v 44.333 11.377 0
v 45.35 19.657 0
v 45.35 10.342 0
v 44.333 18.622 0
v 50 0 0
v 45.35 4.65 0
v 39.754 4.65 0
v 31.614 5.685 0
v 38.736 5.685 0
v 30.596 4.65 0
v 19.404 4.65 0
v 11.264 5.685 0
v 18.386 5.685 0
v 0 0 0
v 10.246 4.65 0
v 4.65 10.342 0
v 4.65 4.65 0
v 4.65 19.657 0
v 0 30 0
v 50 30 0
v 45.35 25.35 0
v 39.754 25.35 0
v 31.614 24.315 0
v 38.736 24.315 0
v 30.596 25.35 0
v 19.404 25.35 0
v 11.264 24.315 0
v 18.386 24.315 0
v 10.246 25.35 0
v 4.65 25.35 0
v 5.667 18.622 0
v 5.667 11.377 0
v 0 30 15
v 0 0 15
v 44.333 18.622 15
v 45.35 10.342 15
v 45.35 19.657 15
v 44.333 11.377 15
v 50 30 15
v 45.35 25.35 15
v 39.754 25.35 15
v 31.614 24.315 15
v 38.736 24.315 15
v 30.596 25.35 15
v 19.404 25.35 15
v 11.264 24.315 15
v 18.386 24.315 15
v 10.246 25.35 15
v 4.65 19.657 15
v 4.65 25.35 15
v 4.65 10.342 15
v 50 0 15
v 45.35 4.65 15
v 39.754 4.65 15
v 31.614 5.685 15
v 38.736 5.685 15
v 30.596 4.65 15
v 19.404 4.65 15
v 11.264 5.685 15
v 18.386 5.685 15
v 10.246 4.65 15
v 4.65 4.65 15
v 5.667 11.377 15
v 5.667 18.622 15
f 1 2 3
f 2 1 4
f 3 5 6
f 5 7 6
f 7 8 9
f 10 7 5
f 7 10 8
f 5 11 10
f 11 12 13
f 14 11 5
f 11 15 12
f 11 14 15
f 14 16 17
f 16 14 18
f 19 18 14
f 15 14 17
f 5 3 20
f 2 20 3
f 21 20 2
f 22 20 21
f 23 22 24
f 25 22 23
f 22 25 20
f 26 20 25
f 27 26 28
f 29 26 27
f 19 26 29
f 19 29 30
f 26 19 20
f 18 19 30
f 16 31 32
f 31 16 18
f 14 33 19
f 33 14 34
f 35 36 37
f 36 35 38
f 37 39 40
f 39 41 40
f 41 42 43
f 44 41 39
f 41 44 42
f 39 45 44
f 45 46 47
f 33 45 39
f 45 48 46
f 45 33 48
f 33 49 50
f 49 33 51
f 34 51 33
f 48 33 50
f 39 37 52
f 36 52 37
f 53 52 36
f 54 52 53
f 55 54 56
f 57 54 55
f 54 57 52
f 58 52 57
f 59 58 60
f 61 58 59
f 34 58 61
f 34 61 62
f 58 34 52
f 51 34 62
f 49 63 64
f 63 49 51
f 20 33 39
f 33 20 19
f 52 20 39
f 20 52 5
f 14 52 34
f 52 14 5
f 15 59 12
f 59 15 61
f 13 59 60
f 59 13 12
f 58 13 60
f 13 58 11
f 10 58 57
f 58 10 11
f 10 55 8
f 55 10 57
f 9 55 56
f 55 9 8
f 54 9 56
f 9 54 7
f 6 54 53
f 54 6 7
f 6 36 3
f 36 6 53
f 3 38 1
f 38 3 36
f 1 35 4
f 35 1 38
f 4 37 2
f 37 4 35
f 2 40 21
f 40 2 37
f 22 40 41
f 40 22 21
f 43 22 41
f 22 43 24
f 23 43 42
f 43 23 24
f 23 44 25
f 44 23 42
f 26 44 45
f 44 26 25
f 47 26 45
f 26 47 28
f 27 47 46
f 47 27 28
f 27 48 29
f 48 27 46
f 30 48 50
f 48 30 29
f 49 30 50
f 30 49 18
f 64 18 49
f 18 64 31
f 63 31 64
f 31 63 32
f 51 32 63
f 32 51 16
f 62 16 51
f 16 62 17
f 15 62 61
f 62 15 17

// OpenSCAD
// file: constants.scad
tolerance=0.7;
oversize = 0.7;
lengthHoleSpacing=20;
wallWidth=5;
//vslotIndentHeight=4;
vslotIndentHeight= 1;
//indentWidthOutside = 6;
indentWidthOutside = 9;
//indentWidthInside = 6;
indentWidthInside = 7;
sectionWidth=20;
profileSize=20;
sectionCountWidth = 2;
sectionCountDepth = 1;
extrusionWidth=profileSize*sectionCountWidth;
extrusionDepth=profileSize*sectionCountDepth;
nema17Width = 42.3;
nema17HoleRadius = 11.05 + tolerance/2;
nema17Height = 3.5*extrusionWidth;
nema17BoltSpacing = 31;
nema17BeltHoleHeight = 8;
nema17BeltOffsetFromTopExtrusion = 8;
nema17BeltHeightWidth = 15;
wallSpacing=5;
screwHeight = wallSpacing+vslotIndentHeight;
// main file
include<constants.scad>;

testPiece=true;
if (testPiece) {
    zExtrusionLength = 15;
    zExtrusionWidthSections = 2;
    zExtrusionDepthSections = 1;
    difference() {
        linear_extrude(height=zExtrusionLength)
            square([
                sectionWidth*zExtrusionWidthSections+wallWidth*2,
                sectionWidth*zExtrusionDepthSections+wallWidth*2
            ]);
        translate([wallWidth, wallWidth, 0]) {
            linear_extrude(height=zExtrusionLength)
            VSlot2dProfile(
                sectionCountWidth=zExtrusionWidthSections, 
                sectionCountDepth=zExtrusionDepthSections,
                indentHeight=vslotIndentHeight,
                oversize=oversize
            );
        }; 
        /*
        negativeSpaceHoles(
            extrusionLength=zExtrusionLength,
            fullIndentHeight=wallWidth+vslotIndentHeight,
            firstIndentOffset=wallWidth,
            widthSections=zExtrusionWidthSections,
            lengthHoleSpacing=lengthHoleSpacing
        );*/        
    };
}

module extrusionIndent(_indentWidthInside, _indentWidthOutside, _indentHeight) {
    polygon(points=[
            [0,0], 
            [(_indentWidthOutside-_indentWidthInside)/2, _indentHeight], 
            [_indentWidthInside + (_indentWidthOutside-_indentWidthInside)/2, _indentHeight],
            [_indentWidthOutside, 0]
        ]);
};

module VSlot2dProfile(
    extrusionLength,
    sectionWidth = 20,
    indentHeight = vslotIndentHeight,
    sectionCountWidth,
    sectionCountDepth,
    topIndent = true,
    bottomIndent = true,
    leftIndent = true,
    rightIndent = true,
    oversize = 0
)
{
    translate([-oversize/2,-oversize/2,-oversize/2])
    resize([
        sectionWidth*sectionCountWidth+oversize,
        sectionWidth*sectionCountDepth+oversize,
        extrusionLength+oversize
    ]) difference() {
        
            square(
                size=[
                    sectionWidth*sectionCountWidth, 
                    sectionWidth*sectionCountDepth
                ]
            );
        for(i = [0:sectionCountWidth]) {
            // bottom indents
            if (bottomIndent) 
                translate([i * sectionWidth + (sectionWidth-indentWidthOutside)/2, 0, 0])
                extrusionIndent(indentWidthInside,indentWidthOutside,indentHeight);
            
            // top indents
            if (topIndent)
                translate([
                    i * sectionWidth + (sectionWidth-indentWidthOutside)/2, 
                    sectionWidth*sectionCountDepth, 
                    0
                ])
                rotate([180,0,0])
                extrusionIndent(indentWidthInside,indentWidthOutside,indentHeight);
        }
        for(i = [0:sectionCountDepth]) {
            // left side indent
            if (leftIndent)
                translate([0, (i+1) * sectionWidth - (sectionWidth-indentWidthOutside)/2, 0])
                rotate([0,0,-90]) 
                extrusionIndent(indentWidthInside,indentWidthOutside,indentHeight);
            
            // right side inden
            if (rightIndent)
                translate([
                    sectionWidth*sectionCountWidth, 
                    i * sectionWidth + (sectionWidth-indentWidthOutside)/2, 
                    0
                ])
                rotate([0,0,90]) 
                extrusionIndent(indentWidthInside,indentWidthOutside,indentHeight);
        }
    }
};


module negativeSpaceHole(
    largeHoleIndent = largeHoleIndent,
    fullIndentHeight = wallSpacing+vslotIndentHeight,
    largeHoleRadius = 5,
    smallHoleRadius = 2.5,
    )
{ 
    cylinder(h=largeHoleHeight,r=largeHoleRadius,center=false, $fn=90);
    cylinder(h=fullIndentHeight,r=smallHoleRadius,center=false, $fn=90);
}

module negativeSpaceHolePoints(
    largeHoleIndent = 1,
    largeHoleRadius = 5,
    smallHoleRadius = 2.5,
    fullIndentHeight,
    points = []
    )
{
    for (i=[0:len(points)-1]){
        translate([points[i][1],0,points[i][0]]) {
            rotate([-90,0,0]) {
                echo(points[i][0], points[i][1]);
                negativeSpaceHole(
                    largeHoleHeight=largeHoleIndent,
                    fullIndentHeight=fullIndentHeight,
                    largeHoleRadius=largeHoleRadius,
                    smallHoleRadius=smallHoleRadius);
            };
        }
    }
}

module negativeSpaceHoles(
    largeHoleIndent = 1,
    largeHoleRadius = 5,
    smallHoleRadius = 2.5,
    widthHoleSpacing = 20,
    fullIndentHeight,
    lengthHoleSpacing,
    extrusionLength,
    firstIndentOffset,
    widthSections
    ) 
{
    
    negativeSpaceHolePoints(
        largeHoleIndent = largeHoleIndent,
        largeHoleRadius = largeHoleRadius,
        smallHoleRadius = smallHoleRadius,
        fullIndentHeight = fullIndentHeight,
        lengthHoleSpacing = lengthHoleSpacing,
        widthSections = widthSections,
        points=[ 
            for (p = [lengthHoleSpacing/2+firstIndentOffset:lengthHoleSpacing:extrusionLength-firstIndentOffset-lengthHoleSpacing/2]) 
            for (s = [firstIndentOffset+widthHoleSpacing/2:widthHoleSpacing:widthHoleSpacing*widthSections]) 
            [p,s]
         ]
            
    );
}


module drawVslotExtrusion(
    height, 
    sectionCountWidth, 
    sectionCountDepth, 
    topIndent=true, 
    rightIndent=true, 
    leftIndent=true, 
    bottomIndent=true, 
    oversize=0,
    screwHeight=screwHeight,
    screwOffset=0,
    leftScrewPoints = [],
    rightScrewPoints = [], 
    topScrewPoints = [],
    bottomScrewPoints = [],
    backScrewPoints = []
    ) 
{
    linear_extrude(height=height) 
        VSlot2dProfile(
            sectionCountWidth=sectionCountWidth,
            sectionCountDepth=sectionCountDepth,
            topIndent=topIndent,
            bottomIndent= bottomIndent,
            leftIndent=leftIndent,
            rightIndent=rightIndent,
            oversize=oversize);
    
    if (len(topScrewPoints) > 0) {
        points = [ 
            for(i = [0:len(topScrewPoints)-1])
            for(j=[profileSize/2:profileSize:sectionCountWidth*profileSize])
            [topScrewPoints[i],j]
        ];
            translate([0,-screwHeight+vslotIndentHeight,0])
        negativeSpaceHolePoints(
            largeHoleIndent = screwHeight-screwOffset,
            fullIndentHeight=screwHeight,
            points = points
        );
    };
    if (len(bottomScrewPoints) > 0) {
        points = [ 
            for(i = [0:len(bottomScrewPoints)-1])
            for(j=[profileSize/2:profileSize:sectionCountWidth*profileSize])
            [height-bottomScrewPoints[i],j]
        ];
            translate([0,screwHeight+sectionCountDepth*profileSize-vslotIndentHeight,height])
            rotate([180,0,0])
        negativeSpaceHolePoints(
            largeHoleIndent = screwHeight-screwOffset,
            fullIndentHeight=screwHeight+oversize,
            points = points
        );
    };
    if (len(leftScrewPoints) > 0) {
        points = [ 
            for(i = [0:len(leftScrewPoints)-1])
            for(j=[profileSize/2:profileSize:sectionCountDepth*profileSize])
            [leftScrewPoints[i],j]
        ];
            translate([-screwHeight+vslotIndentHeight,sectionCountDepth*profileSize,0])
            rotate([0,0,-90])
        negativeSpaceHolePoints(
            largeHoleIndent = screwHeight-screwOffset,
            fullIndentHeight=screwHeight+oversize,
            points = points
        );
    };
    if (len(rightScrewPoints) > 0) {
        points = [ 
            for(i = [0:len(rightScrewPoints)-1])
            for(j=[profileSize/2:profileSize:sectionCountDepth*profileSize])
            [rightScrewPoints[i],j]
        ];
            translate([sectionCountWidth*profileSize+screwHeight-vslotIndentHeight,0,0])
            rotate([0,0,90])
        negativeSpaceHolePoints(
            largeHoleIndent = screwHeight-screwOffset,
            fullIndentHeight=screwHeight+oversize,
            points = points
        );
    };
    if (len(backScrewPoints) > 0) {
        points = [ 
            for(i = [0:len(backScrewPoints)-1])
            for(j=[profileSize/2:profileSize:sectionCountWidth*profileSize])
            [backScrewPoints[i],j]
        ];
            translate([0,sectionCountDepth*profileSize,-screwHeight+vslotIndentHeight])
            rotate([90,0,0])
        negativeSpaceHolePoints(
            largeHoleIndent = screwHeight-screwOffset,
            fullIndentHeight=screwHeight,
            points = points
        );
    };
    /*
        translate([profileSize/2,0,0])
        for(i = [0:len(leftScrewPoints)])
        for(j=[0:profileSize:sectionCountDepth*profileSize]) {
            translate([0,leftScrewPoints[i]],j) 
                negativeSpaceHole(largeHoleHeight = screwHeight-screwOffset, fullIndentHeight = screwHeight);
            }
    */
}


        
